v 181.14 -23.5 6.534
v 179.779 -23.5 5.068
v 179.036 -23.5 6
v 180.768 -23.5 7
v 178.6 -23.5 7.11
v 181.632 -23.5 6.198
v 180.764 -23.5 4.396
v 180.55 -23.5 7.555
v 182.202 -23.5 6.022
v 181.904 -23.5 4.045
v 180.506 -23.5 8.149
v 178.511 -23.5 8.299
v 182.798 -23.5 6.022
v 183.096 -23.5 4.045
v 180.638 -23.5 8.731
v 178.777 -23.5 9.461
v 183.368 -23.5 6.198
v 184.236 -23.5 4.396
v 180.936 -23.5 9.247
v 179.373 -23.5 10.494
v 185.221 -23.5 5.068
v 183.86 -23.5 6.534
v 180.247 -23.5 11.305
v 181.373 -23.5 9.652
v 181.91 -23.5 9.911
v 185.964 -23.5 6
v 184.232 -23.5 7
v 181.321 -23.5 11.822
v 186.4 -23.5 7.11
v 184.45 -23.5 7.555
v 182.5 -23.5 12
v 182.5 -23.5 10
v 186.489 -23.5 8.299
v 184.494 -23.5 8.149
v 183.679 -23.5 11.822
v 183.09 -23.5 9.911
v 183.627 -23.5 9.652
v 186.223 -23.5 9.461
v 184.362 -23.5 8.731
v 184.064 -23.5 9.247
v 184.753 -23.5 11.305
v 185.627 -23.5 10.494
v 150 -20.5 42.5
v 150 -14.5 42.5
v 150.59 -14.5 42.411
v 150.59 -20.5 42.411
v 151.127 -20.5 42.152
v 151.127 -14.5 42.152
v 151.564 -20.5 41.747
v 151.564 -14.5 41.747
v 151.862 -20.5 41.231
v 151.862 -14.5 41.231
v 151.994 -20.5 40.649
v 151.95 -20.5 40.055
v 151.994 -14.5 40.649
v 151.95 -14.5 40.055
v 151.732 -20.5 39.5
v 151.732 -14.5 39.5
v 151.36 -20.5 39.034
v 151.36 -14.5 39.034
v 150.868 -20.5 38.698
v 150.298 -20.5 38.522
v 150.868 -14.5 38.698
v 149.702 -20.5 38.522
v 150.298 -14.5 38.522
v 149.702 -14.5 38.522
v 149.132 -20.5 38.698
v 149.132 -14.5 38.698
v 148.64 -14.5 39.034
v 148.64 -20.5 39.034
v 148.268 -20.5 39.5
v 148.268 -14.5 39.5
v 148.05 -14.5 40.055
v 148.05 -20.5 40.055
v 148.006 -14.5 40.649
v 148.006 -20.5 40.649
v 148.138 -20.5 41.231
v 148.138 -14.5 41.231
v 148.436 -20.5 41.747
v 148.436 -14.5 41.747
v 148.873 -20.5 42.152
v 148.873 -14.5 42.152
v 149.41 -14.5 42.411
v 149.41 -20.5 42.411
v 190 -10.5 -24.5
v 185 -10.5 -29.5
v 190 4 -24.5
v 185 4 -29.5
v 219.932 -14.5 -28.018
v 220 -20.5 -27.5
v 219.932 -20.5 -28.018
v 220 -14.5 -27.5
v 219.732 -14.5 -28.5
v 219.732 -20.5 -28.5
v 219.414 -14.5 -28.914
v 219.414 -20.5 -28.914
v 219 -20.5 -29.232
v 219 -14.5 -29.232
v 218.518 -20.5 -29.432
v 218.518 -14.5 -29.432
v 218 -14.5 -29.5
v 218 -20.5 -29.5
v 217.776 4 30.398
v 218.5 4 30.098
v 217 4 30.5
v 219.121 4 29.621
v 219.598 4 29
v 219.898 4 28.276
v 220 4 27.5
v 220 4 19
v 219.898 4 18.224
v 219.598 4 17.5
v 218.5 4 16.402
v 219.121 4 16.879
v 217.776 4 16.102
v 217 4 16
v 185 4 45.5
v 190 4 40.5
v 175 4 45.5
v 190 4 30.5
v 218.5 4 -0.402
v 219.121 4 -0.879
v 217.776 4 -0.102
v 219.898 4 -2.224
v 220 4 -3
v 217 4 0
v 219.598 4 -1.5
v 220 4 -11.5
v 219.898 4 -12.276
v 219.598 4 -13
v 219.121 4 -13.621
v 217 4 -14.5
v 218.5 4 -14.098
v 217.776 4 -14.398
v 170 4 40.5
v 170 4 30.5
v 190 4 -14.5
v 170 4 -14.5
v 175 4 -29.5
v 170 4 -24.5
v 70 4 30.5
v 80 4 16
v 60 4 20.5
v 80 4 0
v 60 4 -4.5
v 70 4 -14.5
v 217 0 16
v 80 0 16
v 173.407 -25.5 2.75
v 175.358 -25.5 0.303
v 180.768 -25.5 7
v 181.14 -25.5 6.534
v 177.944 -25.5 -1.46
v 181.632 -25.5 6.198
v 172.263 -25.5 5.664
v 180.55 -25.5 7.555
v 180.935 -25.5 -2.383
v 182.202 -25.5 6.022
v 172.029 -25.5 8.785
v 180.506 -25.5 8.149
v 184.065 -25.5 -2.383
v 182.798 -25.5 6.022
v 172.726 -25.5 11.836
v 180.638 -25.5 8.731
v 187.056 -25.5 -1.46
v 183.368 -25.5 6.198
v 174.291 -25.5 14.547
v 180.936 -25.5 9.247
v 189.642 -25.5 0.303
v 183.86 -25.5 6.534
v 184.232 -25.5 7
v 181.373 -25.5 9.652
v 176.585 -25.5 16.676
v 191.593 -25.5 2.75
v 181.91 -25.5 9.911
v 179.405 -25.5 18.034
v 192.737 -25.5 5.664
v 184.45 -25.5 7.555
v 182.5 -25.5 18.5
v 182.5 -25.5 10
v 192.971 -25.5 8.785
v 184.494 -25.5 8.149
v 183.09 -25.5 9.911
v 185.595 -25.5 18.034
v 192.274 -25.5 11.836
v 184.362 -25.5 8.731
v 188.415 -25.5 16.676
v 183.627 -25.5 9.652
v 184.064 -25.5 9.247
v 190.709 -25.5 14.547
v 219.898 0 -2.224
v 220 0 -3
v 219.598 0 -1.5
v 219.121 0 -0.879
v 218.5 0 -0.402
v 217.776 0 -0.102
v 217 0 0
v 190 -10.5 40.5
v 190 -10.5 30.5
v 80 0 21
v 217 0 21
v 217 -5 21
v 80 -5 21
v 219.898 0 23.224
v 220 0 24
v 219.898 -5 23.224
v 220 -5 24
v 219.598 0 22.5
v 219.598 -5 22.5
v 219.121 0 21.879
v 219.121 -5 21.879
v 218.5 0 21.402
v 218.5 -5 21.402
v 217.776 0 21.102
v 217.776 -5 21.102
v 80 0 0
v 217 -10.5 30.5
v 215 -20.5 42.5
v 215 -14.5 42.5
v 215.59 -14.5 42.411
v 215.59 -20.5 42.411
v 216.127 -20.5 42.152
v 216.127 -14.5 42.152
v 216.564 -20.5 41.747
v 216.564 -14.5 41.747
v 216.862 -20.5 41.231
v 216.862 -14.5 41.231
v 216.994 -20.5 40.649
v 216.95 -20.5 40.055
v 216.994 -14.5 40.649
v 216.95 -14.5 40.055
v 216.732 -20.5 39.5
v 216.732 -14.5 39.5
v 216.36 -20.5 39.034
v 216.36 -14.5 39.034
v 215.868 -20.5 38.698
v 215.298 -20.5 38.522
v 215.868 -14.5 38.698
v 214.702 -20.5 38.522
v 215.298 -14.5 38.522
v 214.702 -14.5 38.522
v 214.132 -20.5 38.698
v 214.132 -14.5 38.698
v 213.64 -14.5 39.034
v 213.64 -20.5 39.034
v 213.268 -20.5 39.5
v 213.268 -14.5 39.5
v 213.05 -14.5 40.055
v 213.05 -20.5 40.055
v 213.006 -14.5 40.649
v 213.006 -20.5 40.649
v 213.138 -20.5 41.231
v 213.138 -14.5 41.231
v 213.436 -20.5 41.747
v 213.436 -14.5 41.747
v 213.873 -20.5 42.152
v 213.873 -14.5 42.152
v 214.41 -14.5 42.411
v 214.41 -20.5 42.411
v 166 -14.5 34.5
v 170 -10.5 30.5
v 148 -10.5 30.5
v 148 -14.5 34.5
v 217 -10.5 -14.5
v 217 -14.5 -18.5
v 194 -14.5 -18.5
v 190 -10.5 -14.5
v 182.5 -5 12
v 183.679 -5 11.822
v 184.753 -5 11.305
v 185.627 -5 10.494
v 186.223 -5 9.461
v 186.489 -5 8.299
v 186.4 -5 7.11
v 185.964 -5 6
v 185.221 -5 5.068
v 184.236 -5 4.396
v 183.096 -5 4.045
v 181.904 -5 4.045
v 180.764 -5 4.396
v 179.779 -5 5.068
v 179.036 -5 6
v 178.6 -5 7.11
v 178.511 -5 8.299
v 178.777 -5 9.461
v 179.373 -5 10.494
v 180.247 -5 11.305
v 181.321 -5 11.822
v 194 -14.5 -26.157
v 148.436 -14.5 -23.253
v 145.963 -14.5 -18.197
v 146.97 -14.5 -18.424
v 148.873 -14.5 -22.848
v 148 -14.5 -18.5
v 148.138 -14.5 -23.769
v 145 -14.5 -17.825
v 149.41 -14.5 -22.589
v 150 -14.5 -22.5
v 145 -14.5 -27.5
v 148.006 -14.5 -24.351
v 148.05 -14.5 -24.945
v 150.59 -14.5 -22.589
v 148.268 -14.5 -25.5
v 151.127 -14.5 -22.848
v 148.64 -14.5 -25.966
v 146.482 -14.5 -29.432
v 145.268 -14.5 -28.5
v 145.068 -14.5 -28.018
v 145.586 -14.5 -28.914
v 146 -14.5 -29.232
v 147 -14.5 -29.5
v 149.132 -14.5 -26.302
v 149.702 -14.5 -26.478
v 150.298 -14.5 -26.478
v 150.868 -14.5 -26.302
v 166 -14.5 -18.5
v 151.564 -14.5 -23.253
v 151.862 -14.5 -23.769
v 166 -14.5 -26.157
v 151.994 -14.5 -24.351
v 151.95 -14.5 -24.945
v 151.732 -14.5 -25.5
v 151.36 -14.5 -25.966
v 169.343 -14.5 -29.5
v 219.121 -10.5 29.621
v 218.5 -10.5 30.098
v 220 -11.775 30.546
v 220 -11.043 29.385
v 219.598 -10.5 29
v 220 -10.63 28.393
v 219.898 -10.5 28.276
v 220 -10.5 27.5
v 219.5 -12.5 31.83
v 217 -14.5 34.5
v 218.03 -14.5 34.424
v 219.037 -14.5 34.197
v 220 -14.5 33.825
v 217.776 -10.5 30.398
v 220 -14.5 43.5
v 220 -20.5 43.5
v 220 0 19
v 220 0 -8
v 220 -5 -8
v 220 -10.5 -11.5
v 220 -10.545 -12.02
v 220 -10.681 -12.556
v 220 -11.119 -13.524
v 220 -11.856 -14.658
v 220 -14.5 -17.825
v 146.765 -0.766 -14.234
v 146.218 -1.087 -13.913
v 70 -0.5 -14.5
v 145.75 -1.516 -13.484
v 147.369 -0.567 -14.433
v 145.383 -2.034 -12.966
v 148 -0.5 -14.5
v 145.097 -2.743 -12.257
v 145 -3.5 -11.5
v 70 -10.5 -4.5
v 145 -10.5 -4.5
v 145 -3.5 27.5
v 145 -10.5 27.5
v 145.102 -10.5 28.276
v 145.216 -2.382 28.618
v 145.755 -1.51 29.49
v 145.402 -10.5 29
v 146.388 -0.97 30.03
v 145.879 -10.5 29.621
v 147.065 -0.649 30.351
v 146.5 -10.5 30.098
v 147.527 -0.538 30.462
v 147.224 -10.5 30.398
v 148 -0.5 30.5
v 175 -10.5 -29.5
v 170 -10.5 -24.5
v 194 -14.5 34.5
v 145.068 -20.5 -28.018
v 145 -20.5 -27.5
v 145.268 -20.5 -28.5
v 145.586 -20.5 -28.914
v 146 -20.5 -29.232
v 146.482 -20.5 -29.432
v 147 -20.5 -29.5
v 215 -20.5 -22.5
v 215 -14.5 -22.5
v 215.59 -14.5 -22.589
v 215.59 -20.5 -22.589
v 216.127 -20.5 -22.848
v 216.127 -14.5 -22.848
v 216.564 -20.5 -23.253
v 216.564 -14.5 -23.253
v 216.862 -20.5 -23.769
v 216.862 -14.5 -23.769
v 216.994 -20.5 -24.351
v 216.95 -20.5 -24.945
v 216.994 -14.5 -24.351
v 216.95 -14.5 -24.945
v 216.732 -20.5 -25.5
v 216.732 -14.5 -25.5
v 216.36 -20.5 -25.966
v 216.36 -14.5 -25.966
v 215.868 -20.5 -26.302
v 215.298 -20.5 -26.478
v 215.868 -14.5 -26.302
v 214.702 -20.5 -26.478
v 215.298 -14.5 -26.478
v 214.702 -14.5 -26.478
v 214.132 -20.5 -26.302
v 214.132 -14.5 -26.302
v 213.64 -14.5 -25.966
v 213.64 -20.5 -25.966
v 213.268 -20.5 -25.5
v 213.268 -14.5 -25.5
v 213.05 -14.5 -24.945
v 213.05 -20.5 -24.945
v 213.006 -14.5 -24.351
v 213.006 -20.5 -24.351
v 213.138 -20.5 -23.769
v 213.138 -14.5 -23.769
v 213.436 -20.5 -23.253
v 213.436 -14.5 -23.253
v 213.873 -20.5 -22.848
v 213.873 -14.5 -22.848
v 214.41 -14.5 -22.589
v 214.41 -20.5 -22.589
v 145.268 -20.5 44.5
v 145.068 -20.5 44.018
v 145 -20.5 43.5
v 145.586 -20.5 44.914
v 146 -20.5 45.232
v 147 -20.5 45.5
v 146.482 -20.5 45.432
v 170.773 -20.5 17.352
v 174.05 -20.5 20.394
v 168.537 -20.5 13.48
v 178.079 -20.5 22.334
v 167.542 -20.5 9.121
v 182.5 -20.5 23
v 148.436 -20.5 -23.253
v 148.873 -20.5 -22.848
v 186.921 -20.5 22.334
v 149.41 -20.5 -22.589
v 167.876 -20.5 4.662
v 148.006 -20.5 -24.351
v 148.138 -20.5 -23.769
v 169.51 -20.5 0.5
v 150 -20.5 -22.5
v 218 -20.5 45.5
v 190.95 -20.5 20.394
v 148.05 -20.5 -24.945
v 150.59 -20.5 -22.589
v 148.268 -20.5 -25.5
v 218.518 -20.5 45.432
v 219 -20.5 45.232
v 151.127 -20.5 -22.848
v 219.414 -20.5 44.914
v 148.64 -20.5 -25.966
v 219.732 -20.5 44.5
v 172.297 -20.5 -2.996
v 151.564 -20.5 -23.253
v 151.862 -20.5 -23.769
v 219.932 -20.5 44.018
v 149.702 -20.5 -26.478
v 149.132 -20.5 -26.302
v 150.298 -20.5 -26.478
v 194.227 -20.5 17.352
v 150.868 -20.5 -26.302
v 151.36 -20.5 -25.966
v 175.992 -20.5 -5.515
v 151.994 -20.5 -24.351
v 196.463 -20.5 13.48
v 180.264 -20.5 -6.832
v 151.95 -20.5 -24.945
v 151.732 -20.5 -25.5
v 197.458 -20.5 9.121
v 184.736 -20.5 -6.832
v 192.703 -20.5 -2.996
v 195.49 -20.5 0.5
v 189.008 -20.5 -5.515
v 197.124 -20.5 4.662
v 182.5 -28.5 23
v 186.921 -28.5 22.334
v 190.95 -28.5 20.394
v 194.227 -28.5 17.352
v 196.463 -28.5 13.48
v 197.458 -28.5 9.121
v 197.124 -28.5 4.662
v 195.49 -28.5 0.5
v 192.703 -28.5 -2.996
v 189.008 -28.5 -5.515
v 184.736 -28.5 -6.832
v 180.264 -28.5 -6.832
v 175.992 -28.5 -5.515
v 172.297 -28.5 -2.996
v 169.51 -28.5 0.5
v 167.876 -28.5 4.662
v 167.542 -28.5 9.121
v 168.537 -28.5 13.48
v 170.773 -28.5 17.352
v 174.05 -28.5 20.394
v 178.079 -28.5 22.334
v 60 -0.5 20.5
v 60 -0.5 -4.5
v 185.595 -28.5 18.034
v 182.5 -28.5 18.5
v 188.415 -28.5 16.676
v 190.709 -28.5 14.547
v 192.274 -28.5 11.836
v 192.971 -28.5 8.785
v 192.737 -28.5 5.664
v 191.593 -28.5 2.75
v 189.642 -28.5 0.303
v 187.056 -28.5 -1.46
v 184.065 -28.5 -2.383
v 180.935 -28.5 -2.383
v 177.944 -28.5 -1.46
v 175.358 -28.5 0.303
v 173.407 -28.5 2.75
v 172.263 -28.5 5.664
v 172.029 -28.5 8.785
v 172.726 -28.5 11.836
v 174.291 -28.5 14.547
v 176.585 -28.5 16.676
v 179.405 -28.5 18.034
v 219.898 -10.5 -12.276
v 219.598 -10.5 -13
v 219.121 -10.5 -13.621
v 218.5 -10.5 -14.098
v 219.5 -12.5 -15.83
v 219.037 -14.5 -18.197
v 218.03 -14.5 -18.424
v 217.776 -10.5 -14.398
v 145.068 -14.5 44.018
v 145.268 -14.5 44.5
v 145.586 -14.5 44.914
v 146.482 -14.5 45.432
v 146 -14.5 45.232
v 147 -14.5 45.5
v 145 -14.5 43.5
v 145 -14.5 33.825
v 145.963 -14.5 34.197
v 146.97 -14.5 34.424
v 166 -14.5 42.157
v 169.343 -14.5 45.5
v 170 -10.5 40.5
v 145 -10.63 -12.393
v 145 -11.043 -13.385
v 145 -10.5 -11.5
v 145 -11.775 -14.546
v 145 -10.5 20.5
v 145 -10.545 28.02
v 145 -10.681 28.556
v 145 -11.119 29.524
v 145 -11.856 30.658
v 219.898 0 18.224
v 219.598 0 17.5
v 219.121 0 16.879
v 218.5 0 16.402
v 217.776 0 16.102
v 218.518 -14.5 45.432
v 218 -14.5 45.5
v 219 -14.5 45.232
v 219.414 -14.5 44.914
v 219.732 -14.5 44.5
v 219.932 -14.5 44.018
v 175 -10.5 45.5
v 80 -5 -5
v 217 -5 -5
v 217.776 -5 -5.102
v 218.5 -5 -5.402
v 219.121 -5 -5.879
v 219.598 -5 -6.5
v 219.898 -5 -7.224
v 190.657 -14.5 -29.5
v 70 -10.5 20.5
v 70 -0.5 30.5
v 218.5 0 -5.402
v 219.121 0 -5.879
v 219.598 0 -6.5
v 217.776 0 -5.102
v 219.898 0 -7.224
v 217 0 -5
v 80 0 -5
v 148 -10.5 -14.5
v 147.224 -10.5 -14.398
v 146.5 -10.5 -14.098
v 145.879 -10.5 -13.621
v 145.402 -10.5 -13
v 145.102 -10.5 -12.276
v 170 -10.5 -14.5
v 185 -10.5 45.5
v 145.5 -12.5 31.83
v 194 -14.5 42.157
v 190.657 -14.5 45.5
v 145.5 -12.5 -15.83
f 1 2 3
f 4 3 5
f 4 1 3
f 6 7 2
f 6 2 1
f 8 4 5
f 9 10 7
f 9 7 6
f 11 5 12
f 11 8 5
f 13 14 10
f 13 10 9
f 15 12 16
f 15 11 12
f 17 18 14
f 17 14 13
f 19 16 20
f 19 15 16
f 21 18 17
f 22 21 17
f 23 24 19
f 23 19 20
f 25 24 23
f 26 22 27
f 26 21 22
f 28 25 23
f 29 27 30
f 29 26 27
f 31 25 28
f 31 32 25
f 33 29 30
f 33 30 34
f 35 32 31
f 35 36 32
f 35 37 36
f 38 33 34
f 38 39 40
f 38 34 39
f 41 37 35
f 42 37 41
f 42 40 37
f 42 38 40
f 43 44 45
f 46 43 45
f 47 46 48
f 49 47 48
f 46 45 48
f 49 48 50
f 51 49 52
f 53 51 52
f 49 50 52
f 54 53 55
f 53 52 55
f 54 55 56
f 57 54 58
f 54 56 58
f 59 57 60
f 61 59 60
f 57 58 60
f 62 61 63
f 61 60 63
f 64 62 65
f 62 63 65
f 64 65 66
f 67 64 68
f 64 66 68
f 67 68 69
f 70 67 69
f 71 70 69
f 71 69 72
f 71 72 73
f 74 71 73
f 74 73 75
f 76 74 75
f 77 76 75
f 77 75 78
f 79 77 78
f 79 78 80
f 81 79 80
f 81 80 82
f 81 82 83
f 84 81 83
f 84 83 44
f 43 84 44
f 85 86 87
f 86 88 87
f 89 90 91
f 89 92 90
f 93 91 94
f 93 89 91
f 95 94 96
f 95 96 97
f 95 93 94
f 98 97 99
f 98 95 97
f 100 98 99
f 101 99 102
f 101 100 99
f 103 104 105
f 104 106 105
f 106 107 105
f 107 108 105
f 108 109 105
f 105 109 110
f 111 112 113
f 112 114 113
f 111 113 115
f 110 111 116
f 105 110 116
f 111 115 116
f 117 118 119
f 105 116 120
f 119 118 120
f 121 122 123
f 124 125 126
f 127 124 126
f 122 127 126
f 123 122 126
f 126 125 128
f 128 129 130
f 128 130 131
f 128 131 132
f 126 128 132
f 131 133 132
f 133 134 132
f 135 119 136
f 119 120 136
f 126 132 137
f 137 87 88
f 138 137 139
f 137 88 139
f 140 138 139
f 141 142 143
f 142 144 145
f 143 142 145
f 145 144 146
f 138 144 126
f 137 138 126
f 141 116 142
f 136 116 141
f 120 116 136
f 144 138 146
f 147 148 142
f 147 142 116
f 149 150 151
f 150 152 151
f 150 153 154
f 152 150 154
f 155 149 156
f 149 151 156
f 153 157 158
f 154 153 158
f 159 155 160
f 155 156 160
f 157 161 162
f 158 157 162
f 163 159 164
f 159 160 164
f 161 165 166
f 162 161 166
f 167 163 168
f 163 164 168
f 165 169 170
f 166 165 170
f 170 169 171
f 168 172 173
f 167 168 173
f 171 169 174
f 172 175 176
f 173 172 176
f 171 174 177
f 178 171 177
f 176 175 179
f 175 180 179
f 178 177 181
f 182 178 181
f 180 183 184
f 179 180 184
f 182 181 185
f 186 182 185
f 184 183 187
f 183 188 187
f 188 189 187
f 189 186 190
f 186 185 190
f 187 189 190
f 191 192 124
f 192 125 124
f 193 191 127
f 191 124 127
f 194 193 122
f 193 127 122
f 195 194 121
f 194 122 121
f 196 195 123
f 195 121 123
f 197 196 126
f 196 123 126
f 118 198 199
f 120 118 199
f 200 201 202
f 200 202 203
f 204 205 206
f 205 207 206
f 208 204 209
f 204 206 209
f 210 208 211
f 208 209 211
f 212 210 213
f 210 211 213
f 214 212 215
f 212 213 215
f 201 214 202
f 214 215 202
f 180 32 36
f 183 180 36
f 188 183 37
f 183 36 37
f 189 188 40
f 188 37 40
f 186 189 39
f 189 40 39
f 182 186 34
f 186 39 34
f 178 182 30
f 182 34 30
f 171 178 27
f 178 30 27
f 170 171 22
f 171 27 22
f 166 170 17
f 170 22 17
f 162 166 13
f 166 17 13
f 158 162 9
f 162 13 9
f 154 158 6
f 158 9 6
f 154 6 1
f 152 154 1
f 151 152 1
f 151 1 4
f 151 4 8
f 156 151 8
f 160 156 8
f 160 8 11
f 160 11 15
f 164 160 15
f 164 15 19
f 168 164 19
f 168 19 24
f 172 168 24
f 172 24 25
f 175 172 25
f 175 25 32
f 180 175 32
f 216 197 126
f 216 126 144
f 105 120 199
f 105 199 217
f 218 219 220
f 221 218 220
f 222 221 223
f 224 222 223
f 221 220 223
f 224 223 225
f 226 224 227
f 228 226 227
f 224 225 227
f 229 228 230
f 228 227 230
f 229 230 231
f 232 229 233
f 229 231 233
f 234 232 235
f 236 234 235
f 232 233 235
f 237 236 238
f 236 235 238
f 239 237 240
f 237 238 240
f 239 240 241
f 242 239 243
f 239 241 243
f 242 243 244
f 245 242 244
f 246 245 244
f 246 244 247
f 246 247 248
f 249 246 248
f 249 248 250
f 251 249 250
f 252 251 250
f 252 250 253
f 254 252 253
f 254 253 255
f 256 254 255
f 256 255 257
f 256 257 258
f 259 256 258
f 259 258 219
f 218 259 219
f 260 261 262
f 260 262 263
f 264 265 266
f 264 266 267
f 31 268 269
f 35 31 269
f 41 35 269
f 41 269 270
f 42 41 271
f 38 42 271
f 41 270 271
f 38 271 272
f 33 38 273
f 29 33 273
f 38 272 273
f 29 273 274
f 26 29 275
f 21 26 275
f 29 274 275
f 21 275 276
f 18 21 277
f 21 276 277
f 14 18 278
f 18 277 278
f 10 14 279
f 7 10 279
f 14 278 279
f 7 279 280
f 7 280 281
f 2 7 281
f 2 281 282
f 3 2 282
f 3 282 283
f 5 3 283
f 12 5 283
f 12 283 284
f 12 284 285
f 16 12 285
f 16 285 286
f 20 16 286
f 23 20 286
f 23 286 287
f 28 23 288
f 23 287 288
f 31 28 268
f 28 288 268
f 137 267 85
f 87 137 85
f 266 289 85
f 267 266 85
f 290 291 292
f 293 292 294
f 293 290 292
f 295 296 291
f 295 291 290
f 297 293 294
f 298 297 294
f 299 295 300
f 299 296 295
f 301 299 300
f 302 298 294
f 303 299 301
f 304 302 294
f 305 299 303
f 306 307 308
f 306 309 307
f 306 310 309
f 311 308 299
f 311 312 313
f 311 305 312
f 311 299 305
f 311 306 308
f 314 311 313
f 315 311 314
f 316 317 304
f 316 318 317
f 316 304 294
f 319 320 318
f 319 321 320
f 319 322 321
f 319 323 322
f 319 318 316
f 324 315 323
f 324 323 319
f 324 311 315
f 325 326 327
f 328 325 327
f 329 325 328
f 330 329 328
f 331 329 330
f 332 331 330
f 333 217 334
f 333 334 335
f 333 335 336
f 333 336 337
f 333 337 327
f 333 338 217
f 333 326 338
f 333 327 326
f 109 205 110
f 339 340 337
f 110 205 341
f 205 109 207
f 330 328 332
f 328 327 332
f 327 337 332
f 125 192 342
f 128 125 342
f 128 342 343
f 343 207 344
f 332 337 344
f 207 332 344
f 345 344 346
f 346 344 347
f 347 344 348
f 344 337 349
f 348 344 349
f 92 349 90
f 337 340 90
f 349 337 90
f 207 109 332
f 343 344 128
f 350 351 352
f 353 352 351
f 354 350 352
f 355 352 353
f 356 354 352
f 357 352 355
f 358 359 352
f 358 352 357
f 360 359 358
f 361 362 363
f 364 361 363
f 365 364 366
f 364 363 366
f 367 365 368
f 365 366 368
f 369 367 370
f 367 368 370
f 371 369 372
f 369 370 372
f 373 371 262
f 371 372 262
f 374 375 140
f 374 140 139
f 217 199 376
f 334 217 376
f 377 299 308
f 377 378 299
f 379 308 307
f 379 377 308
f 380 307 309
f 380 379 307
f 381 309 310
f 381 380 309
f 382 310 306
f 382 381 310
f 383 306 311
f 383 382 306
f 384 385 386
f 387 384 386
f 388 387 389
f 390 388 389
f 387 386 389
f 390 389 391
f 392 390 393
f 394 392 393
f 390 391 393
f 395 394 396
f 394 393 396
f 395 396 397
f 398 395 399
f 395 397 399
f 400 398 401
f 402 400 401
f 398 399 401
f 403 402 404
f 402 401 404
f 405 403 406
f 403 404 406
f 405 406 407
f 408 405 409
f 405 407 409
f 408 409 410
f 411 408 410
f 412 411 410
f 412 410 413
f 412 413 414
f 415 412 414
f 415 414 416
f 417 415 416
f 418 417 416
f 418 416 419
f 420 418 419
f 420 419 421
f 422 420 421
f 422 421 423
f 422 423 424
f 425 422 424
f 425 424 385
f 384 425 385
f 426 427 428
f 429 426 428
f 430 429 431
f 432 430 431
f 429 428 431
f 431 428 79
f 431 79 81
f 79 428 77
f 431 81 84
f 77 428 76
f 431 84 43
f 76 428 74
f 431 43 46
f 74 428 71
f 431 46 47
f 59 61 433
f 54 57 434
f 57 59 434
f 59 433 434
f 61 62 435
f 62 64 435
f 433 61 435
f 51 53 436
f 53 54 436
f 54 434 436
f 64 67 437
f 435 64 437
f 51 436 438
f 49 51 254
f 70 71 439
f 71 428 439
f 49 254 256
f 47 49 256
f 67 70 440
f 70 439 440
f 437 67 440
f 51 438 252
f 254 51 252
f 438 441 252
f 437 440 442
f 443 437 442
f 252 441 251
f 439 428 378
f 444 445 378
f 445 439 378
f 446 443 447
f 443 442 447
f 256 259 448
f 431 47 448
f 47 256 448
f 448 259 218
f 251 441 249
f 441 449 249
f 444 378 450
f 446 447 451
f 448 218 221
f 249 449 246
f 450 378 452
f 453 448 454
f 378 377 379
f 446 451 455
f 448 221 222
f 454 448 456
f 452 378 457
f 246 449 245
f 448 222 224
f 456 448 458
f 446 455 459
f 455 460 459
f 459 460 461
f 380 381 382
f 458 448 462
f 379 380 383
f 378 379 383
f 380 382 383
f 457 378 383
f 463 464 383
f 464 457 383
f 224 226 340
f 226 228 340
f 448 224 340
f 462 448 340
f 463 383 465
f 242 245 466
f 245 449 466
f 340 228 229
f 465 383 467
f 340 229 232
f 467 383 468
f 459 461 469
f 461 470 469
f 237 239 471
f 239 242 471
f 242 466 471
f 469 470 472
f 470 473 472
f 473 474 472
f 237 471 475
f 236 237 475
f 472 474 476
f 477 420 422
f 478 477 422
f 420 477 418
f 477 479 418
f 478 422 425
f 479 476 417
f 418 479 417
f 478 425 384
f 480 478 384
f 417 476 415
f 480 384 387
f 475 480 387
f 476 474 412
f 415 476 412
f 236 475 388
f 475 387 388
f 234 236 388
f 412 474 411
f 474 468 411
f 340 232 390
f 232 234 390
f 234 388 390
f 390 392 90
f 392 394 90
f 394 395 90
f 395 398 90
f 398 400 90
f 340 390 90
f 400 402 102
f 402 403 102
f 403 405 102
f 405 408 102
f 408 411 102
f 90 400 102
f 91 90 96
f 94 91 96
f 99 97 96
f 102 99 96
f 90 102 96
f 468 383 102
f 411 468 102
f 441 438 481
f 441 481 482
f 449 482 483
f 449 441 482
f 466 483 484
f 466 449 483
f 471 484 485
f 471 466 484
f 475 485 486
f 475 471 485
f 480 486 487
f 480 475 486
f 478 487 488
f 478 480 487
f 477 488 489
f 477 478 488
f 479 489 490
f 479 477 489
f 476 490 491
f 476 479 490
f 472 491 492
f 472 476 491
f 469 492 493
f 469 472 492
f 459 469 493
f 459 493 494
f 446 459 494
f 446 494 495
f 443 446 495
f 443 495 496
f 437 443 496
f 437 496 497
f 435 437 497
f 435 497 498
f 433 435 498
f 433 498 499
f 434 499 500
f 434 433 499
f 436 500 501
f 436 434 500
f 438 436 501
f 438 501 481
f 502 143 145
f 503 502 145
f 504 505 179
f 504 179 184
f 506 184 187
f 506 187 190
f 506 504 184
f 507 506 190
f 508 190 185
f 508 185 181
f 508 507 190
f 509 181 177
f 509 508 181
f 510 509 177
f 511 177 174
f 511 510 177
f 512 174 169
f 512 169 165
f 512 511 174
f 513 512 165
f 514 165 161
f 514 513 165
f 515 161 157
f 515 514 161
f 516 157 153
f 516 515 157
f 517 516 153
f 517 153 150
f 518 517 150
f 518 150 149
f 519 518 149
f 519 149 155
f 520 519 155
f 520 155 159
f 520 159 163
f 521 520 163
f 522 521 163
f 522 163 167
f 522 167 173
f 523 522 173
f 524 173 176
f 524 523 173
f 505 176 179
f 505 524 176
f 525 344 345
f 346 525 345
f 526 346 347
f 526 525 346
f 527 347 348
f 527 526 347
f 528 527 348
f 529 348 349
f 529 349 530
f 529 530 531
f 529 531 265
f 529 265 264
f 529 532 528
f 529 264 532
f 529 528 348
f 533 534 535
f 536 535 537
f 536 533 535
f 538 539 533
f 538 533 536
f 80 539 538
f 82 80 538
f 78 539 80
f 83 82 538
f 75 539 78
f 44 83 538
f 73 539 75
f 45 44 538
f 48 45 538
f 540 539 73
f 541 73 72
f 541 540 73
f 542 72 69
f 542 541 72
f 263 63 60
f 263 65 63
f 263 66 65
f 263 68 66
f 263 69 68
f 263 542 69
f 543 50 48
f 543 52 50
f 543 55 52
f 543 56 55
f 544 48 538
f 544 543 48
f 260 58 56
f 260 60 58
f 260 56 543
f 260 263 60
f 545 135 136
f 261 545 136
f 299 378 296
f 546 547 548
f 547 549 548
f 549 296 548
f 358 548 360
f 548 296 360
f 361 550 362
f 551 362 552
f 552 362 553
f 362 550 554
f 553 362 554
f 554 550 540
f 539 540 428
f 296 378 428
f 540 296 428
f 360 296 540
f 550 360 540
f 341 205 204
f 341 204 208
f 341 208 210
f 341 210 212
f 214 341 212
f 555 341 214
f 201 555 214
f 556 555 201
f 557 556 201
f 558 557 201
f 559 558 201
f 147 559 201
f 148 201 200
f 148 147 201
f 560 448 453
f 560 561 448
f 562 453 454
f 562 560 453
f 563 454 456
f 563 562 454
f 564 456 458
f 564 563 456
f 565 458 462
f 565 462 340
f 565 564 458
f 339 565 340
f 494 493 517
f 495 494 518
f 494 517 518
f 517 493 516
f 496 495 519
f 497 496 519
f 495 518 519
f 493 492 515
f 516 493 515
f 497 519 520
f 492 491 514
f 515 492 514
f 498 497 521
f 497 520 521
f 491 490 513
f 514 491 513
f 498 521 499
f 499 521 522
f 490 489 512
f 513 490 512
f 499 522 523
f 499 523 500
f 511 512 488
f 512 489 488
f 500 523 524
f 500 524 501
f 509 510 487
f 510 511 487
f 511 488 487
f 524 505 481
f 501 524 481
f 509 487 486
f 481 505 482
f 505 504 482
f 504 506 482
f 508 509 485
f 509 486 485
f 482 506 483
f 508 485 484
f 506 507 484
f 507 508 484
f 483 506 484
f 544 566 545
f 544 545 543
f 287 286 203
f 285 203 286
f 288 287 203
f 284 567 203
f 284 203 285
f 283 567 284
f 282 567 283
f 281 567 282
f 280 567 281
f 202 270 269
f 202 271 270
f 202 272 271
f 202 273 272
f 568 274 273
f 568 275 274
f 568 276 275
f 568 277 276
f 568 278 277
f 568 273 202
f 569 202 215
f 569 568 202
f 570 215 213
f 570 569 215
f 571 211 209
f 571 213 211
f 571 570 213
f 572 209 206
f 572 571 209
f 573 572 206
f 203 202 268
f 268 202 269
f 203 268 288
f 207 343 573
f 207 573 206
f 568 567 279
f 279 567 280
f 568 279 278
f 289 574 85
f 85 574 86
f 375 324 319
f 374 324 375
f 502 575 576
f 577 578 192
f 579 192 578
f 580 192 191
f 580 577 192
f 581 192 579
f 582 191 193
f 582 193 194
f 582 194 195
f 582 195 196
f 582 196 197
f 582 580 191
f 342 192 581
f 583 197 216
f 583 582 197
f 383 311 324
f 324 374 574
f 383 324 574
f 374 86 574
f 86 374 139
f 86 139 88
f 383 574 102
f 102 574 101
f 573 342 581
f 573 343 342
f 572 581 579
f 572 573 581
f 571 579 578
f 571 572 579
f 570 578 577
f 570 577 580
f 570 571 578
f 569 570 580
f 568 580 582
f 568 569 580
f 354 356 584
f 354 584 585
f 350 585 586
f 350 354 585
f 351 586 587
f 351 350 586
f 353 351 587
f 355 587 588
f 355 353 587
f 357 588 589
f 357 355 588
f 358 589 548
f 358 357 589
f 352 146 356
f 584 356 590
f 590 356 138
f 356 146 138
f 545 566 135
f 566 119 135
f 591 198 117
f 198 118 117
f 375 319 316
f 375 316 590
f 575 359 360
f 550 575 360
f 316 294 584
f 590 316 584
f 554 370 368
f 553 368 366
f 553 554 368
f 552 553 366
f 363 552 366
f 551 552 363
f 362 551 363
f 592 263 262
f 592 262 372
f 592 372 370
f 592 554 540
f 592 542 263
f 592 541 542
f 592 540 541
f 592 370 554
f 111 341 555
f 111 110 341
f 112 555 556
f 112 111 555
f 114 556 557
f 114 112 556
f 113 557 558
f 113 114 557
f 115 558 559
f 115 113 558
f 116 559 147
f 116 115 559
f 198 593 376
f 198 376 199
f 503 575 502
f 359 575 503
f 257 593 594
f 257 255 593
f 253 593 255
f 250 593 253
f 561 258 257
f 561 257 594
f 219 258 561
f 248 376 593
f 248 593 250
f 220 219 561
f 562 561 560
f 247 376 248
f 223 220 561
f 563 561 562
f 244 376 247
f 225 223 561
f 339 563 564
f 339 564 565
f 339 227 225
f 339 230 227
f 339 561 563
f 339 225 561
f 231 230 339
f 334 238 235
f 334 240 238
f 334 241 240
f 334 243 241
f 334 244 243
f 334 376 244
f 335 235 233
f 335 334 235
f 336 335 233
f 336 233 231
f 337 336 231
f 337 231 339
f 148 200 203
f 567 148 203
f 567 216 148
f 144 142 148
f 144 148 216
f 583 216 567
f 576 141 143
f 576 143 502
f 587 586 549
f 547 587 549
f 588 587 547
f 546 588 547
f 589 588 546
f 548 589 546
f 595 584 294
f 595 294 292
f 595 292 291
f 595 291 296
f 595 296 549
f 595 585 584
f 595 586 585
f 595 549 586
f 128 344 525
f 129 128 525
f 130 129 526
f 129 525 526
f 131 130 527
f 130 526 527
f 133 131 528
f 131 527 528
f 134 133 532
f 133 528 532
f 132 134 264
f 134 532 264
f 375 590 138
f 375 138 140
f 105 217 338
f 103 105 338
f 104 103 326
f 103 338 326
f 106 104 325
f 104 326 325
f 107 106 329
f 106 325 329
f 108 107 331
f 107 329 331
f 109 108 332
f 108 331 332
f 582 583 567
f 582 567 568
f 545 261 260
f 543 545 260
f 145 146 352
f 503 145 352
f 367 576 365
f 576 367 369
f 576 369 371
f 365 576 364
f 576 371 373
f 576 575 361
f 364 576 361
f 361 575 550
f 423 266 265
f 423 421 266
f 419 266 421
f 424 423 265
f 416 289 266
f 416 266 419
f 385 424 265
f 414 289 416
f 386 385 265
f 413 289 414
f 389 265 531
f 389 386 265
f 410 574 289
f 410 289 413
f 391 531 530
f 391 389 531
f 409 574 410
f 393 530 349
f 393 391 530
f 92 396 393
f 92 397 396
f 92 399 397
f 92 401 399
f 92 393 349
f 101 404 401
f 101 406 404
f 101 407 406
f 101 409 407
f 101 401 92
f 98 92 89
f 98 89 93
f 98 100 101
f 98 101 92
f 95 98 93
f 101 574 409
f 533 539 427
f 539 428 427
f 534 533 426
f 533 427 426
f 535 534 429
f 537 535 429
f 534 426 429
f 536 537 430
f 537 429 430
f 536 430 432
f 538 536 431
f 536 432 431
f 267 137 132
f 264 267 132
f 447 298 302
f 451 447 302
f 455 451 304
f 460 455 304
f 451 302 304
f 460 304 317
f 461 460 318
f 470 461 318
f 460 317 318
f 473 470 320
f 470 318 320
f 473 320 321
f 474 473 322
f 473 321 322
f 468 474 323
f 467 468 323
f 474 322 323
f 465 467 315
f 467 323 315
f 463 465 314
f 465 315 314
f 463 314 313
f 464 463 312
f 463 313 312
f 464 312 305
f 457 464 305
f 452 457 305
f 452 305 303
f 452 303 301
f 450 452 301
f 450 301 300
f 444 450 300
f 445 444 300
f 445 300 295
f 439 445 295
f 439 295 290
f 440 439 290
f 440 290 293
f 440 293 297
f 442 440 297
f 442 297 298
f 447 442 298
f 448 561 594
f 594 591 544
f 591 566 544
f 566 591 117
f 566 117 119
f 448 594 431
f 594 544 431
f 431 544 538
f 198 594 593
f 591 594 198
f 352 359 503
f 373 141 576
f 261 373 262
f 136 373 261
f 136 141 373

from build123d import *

# Parameters (mm, degrees)
BOSS_EXTRUDE1_DEPTH = 4
BOSS_EXTRUDE2_DEPTH = 5
BOSS_EXTRUDE3_START = -5
SKETCH3_W           = 160
SKETCH3_H           = 75
BOSS_EXTRUDE3_DEPTH = 5.5
BOSS_EXTRUDE4_START = -10.5
BOSS_EXTRUDE4_DEPTH = 10
BOSS_EXTRUDE7_START = -20.5
SKETCH17_R          = 15
BOSS_EXTRUDE7_DEPTH = 8
CUT_EXTRUDE1_START  = -28.5
SKETCH5_R           = 10.5
CUT_EXTRUDE1_DEPTH  = 3
CUT_EXTRUDE2_START  = -4
SKETCH7_R           = 2
CUT_EXTRUDE2_DEPTH  = 25
CUT_EXTRUDE3_START  = -5
SKETCH8_R           = 4
CUT_EXTRUDE3_DEPTH  = 18.5
CUT_EXTRUDE5_START  = 4
SKETCH18_W          = 110
SKETCH18_H          = 15
SKETCH18_W_2        = 30
CUT_EXTRUDE5_DEPTH  = 18.5
CUT_EXTRUDE6_START  = -4
SKETCH9_R           = 2
CUT_EXTRUDE6_DEPTH  = 40
CHAMFER1_SIZE       = 10
FILLET1_R           = 2
CHAMFER2_SIZE       = 5
FILLET6_R           = 3
CHAMFER4_SIZE       = 4


with BuildPart() as part:
    # Sketch1 → Boss-Extrude1 (new body)
    with BuildSketch(Plane(origin=(0, 0, 0), x_dir=(1, 0, 0), z_dir=(0, 1, 0))):
        Polygon((80, -16), (220, -16), (220, -45.5), (60, -45.5), (60, 29.5), (220, 29.5), (220, 0), (80, 0), align=None)
    extrude(amount=BOSS_EXTRUDE1_DEPTH)

    # Sketch2 → Boss-Extrude2 (add)
    with BuildSketch(Plane(origin=(0, 0, 0), x_dir=(1, 0, 0), z_dir=(0, 1, 0))):
        Polygon((220, 5), (220, 29.5), (60, 29.5), (60, -45.5), (220, -45.5), (220, -21), (80, -21), (80, 5), align=None)
    extrude(amount=-BOSS_EXTRUDE2_DEPTH)

    # Sketch3 → Boss-Extrude3 (add)
    with BuildSketch(Plane(origin=(0, 0, 0), x_dir=(1, 0, 0), z_dir=(0, 1, 0)).offset(BOSS_EXTRUDE3_START)):
        with Locations((140, -8)):
            Rectangle(SKETCH3_W, SKETCH3_H)
    extrude(amount=-BOSS_EXTRUDE3_DEPTH)

    # Sketch4 → Boss-Extrude4 (add)
    with BuildSketch(Plane(origin=(0, 0, 0), x_dir=(1, 0, 0), z_dir=(0, 1, 0)).offset(BOSS_EXTRUDE4_START)):
        Polygon((145, -8), (145, -45.5), (220, -45.5), (220, 29.5), (145, 29.5), align=None)
    extrude(amount=-BOSS_EXTRUDE4_DEPTH)

    # Sketch17 → Boss-Extrude7 (add)
    with BuildSketch(Plane(origin=(0, 0, 0), x_dir=(1, 0, 0), z_dir=(0, 1, 0)).offset(BOSS_EXTRUDE7_START)):
        with Locations(Location((182.5, -8, 0), (0, 0, 270))):
            Circle(SKETCH17_R)
    extrude(amount=-BOSS_EXTRUDE7_DEPTH)

    # Sketch5 → Cut-Extrude1 (cut)
    with BuildSketch(Plane(origin=(0, 0, 0), x_dir=(1, 0, 0), z_dir=(0, 1, 0)).offset(CUT_EXTRUDE1_START)):
        with Locations(Location((182.5, -8, 0), (0, 0, 270))):
            Circle(SKETCH5_R)
    extrude(amount=CUT_EXTRUDE1_DEPTH, mode=Mode.SUBTRACT)

    # Sketch7 → Cut-Extrude2 (cut)
    with BuildSketch(Plane(origin=(0, 0, 0), x_dir=(1, 0, 0), z_dir=(0, 1, 0)).offset(CUT_EXTRUDE2_START)):
        with Locations(Location((182.5, -8, 0), (0, 0, 270))):
            Circle(SKETCH7_R)
    extrude(amount=-CUT_EXTRUDE2_DEPTH, mode=Mode.SUBTRACT)

    # Sketch8 → Cut-Extrude3 (cut)
    with BuildSketch(Plane(origin=(0, 0, 0), x_dir=(1, 0, 0), z_dir=(0, 1, 0)).offset(CUT_EXTRUDE3_START)):
        with Locations(Location((182.5, -8, 0), (0, 0, 270))):
            Circle(SKETCH8_R)
    extrude(amount=-CUT_EXTRUDE3_DEPTH, mode=Mode.SUBTRACT)

    # Sketch18 → Cut-Extrude5 (cut)
    with BuildSketch(Plane(origin=(0, 0, 0), x_dir=(1, 0, 0), z_dir=(0, 1, 0)).offset(CUT_EXTRUDE5_START)):
        with Locations((115, 22)):
            Rectangle(SKETCH18_W, SKETCH18_H)
        with Locations((115, -38)):
            Rectangle(SKETCH18_W, SKETCH18_H)
        with Locations((205, 22)):
            Rectangle(SKETCH18_W_2, SKETCH18_H)
        with Locations((205, -38)):
            Rectangle(SKETCH18_W_2, SKETCH18_H)
    extrude(amount=-CUT_EXTRUDE5_DEPTH, mode=Mode.SUBTRACT)

    # Sketch9 → Cut-Extrude6 (cut)
    with BuildSketch(Plane(origin=(0, 0, 0), x_dir=(1, 0, 0), z_dir=(0, 1, 0)).offset(CUT_EXTRUDE6_START)):
        with Locations(Location((150, -40.5, 0), (0, 0, 270))):
            Circle(SKETCH9_R)
        with Locations(Location((150, 24.5, 0), (0, 0, 270))):
            Circle(SKETCH9_R)
        with Locations(Location((215, 24.5, 0), (0, 0, 270))):
            Circle(SKETCH9_R)
        with Locations(Location((215, -40.5, 0), (0, 0, 270))):
            Circle(SKETCH9_R)
    extrude(amount=-CUT_EXTRUDE6_DEPTH, mode=Mode.SUBTRACT)

    # Chamfer1
    chamfer1_edges = [part.edges().sort_by_distance(p)[0] for p in [
        (60, -10.5, 8),
        (102.5, -10.5, 30.5),
        (60, -3.25, 30.5),
        (102.5, -10.5, -14.5),
        (60, -3.25, -14.5),
    ]]
    chamfer(chamfer1_edges, length=CHAMFER1_SIZE)

    # Fillet1
    fillet1_edges = [part.edges().sort_by_distance(p)[0] for p in [
        (220, -17.5, 45.5),
        (220, -17.5, -29.5),
        (145, -17.5, 45.5),
        (145, -17.5, -29.5),
    ]]
    fillet(fillet1_edges, radius=FILLET1_R)

    # Chamfer2
    chamfer2_edges = [part.edges().sort_by_distance(p)[0] for p in [
        (170, -5.25, 45.5),
        (190, -5.25, -29.5),
        (190, -5.25, 45.5),
        (170, -5.25, -29.5),
    ]]
    chamfer(chamfer2_edges, length=CHAMFER2_SIZE)

    # Fillet6
    fillet6_edges = [part.edges().sort_by_distance(p)[0] for p in [
        (220, -5.25, -14.5),
        (220, -5.25, 30.5),
        (220, 2, 16),
        (220, 2, 0),
        (220, -2.5, -5),
        (220, -2.5, 21),
        (145, -7.5, -14.5),
        (145, -7.5, 30.5),
    ]]
    fillet(fillet6_edges, radius=FILLET6_R)

    # Chamfer4
    # the kernel refuses this chamfer: 4 mm, written as the material it adds along each edge
    with BuildSketch(Plane(origin=(180.286731952, -14.5, 30.5), x_dir=(0, 1, 0), z_dir=(-1, 0, 0)), Plane(origin=(180.286731952, -14.5, -14.5), x_dir=(0, 0, -1), z_dir=(-1, 0, 0))) as chamfer4_piece_1:
        Polygon((CHAMFER4_SIZE, 0), (0, -CHAMFER4_SIZE), (0, 0), align=None)
    extrude(amount=32.286731952)
    with BuildSketch(Plane(origin=(217, -14.5, -14.5), x_dir=(0, 0, -1), z_dir=(-1, 0, 0)), Plane(origin=(217, -14.5, 30.5), x_dir=(0, 1, 0), z_dir=(-1, 0, 0))) as chamfer4_piece_2:
        Polygon((CHAMFER4_SIZE, 0), (0, -CHAMFER4_SIZE), (0, 0), align=None)
    extrude(amount=37.286731952)
    with BuildSketch(Plane(origin=(190, -14.5, 20.213268048), x_dir=(1, 0, 0), z_dir=(0, 0, 1))) as chamfer4_piece_3_section:
        Polygon((CHAMFER4_SIZE, 0), (0, CHAMFER4_SIZE), (0, 0), align=None)
    chamfer4_piece_3 = extrude(amount=30.573463904, mode=Mode.PRIVATE)
    chamfer4_piece_3 = split(chamfer4_piece_3, bisect_by=Plane(origin=(200.143365976, -14.5, 30.356634024), z_dir=(-0.7071067811865476, 0, -0.7071067811865476)), keep=Keep.TOP, mode=Mode.PRIVATE)
    add(chamfer4_piece_3)
    with BuildSketch(Plane(origin=(170, -14.5, -34.786731952), x_dir=(-1, 0, 0), z_dir=(0, 0, 1))) as chamfer4_piece_4_section:
        Polygon((CHAMFER4_SIZE, 0), (0, -CHAMFER4_SIZE), (0, 0), align=None)
    chamfer4_piece_4 = extrude(amount=30.573463904, mode=Mode.PRIVATE)
    chamfer4_piece_4 = split(chamfer4_piece_4, bisect_by=Plane(origin=(175.143365976, -14.5, -29.643365976), z_dir=(0.7071067811865476, 0, 0.7071067811865476)), keep=Keep.TOP, mode=Mode.PRIVATE)
    add(chamfer4_piece_4)
    with BuildSketch(Plane(origin=(170, -14.5, 50.786731952), x_dir=(0, 1, 0), z_dir=(0, 0, -1))) as chamfer4_piece_5_section:
        Polygon((CHAMFER4_SIZE, 0), (0, -CHAMFER4_SIZE), (0, 0), align=None)
    chamfer4_piece_5 = extrude(amount=30.573463904, mode=Mode.PRIVATE)
    chamfer4_piece_5 = split(chamfer4_piece_5, bisect_by=Plane(origin=(175.143365976, -14.5, 45.643365976), z_dir=(0.7071067811865476, 0, -0.7071067811865476)), keep=Keep.TOP, mode=Mode.PRIVATE)
    add(chamfer4_piece_5)
    with BuildSketch(Plane(origin=(190, -14.5, -4.213268048), x_dir=(1, 0, 0), z_dir=(0, 0, -1))) as chamfer4_piece_6_section:
        Polygon((CHAMFER4_SIZE, 0), (0, -CHAMFER4_SIZE), (0, 0), align=None)
    chamfer4_piece_6 = extrude(amount=30.573463904, mode=Mode.PRIVATE)
    chamfer4_piece_6 = split(chamfer4_piece_6, bisect_by=Plane(origin=(200.143365976, -14.5, -14.356634024), z_dir=(-0.7071067811865476, 0, 0.7071067811865476)), keep=Keep.TOP, mode=Mode.PRIVATE)
    add(chamfer4_piece_6)
    with BuildSketch(Plane(origin=(177.726182081, -14.5, 52.773817919), x_dir=(0.7071067811865476, 0, 0.7071067811865476), z_dir=(0.7071067811865476, 0, -0.7071067811865476))) as chamfer4_piece_7_section:
        Polygon((CHAMFER4_SIZE, 0), (0, -CHAMFER4_SIZE), (0, 0), align=None)
    chamfer4_piece_7 = extrude(amount=27.644531716, mode=Mode.PRIVATE)
    chamfer4_piece_7 = split(chamfer4_piece_7, bisect_by=Plane(origin=(177.726182081, -14.5, 45.5), z_dir=(0, 0, -1)), keep=Keep.TOP, mode=Mode.PRIVATE)
    chamfer4_piece_7 = split(chamfer4_piece_7, bisect_by=Plane(origin=(190, -14.5, 52.773817919), z_dir=(-1, 0, 0)), keep=Keep.TOP, mode=Mode.PRIVATE)
    add(chamfer4_piece_7)
    with BuildSketch(Plane(origin=(182.273817919, -14.5, 52.773817919), x_dir=(0, 1, 0), z_dir=(-0.7071067811865476, 0, -0.7071067811865476))) as chamfer4_piece_8_section:
        Polygon((CHAMFER4_SIZE, 0), (0, -CHAMFER4_SIZE), (0, 0), align=None)
    chamfer4_piece_8 = extrude(amount=27.644531716, mode=Mode.PRIVATE)
    chamfer4_piece_8 = split(chamfer4_piece_8, bisect_by=Plane(origin=(170, -14.5, 52.773817919), z_dir=(1, 0, 0)), keep=Keep.TOP, mode=Mode.PRIVATE)
    chamfer4_piece_8 = split(chamfer4_piece_8, bisect_by=Plane(origin=(182.273817919, -14.5, 45.5), z_dir=(0, 0, -1)), keep=Keep.TOP, mode=Mode.PRIVATE)
    add(chamfer4_piece_8)
    with BuildSketch(Plane(origin=(182.273817919, -14.5, -36.773817919), x_dir=(-0.7071067811865476, 0, -0.7071067811865476), z_dir=(-0.7071067811865476, 0, 0.7071067811865476))) as chamfer4_piece_9_section:
        Polygon((CHAMFER4_SIZE, 0), (0, -CHAMFER4_SIZE), (0, 0), align=None)
    chamfer4_piece_9 = extrude(amount=27.644531716, mode=Mode.PRIVATE)
    chamfer4_piece_9 = split(chamfer4_piece_9, bisect_by=Plane(origin=(170, -14.5, -36.773817919), z_dir=(1, 0, 0)), keep=Keep.TOP, mode=Mode.PRIVATE)
    chamfer4_piece_9 = split(chamfer4_piece_9, bisect_by=Plane(origin=(182.273817919, -14.5, -29.5), z_dir=(0, 0, 1)), keep=Keep.TOP, mode=Mode.PRIVATE)
    add(chamfer4_piece_9)
    with BuildSketch(Plane(origin=(177.726182081, -14.5, -36.773817919), x_dir=(0.7071067811865476, 0, -0.7071067811865476), z_dir=(0.7071067811865476, 0, 0.7071067811865476))) as chamfer4_piece_10_section:
        Polygon((CHAMFER4_SIZE, 0), (0, CHAMFER4_SIZE), (0, 0), align=None)
    chamfer4_piece_10 = extrude(amount=27.644531716, mode=Mode.PRIVATE)
    chamfer4_piece_10 = split(chamfer4_piece_10, bisect_by=Plane(origin=(190, -14.5, -36.773817919), z_dir=(-1, 0, 0)), keep=Keep.TOP, mode=Mode.PRIVATE)
    chamfer4_piece_10 = split(chamfer4_piece_10, bisect_by=Plane(origin=(177.726182081, -14.5, -29.5), z_dir=(0, 0, 1)), keep=Keep.TOP, mode=Mode.PRIVATE)
    add(chamfer4_piece_10)
    with BuildSketch(Plane(origin=(148, -14.5, -11.5), x_dir=(0, 0, -1), z_dir=(1, 0, 0))) as chamfer4_piece_11_section:
        Polygon((3 + CHAMFER4_SIZE, 0), (3, CHAMFER4_SIZE), (3, 0), align=None)
    chamfer4_piece_11 = revolve(axis=Axis((148, -14.5, -11.5), (0, 1, 0)), revolution_arc=286.541029039, mode=Mode.PRIVATE)
    chamfer4_piece_11 = split(chamfer4_piece_11, bisect_by=Plane(origin=(145, -14.5, -11.5), z_dir=(1, 0, 0)), keep=Keep.TOP, mode=Mode.PRIVATE)
    add(chamfer4_piece_11)
    with BuildSketch(Plane(origin=(148, -14.5, 27.5), x_dir=(0, 0, 1), z_dir=(1, 0, 0))) as chamfer4_piece_12_section:
        Polygon((3, -CHAMFER4_SIZE), (3 + CHAMFER4_SIZE, 0), (3, 0), align=None)
    chamfer4_piece_12 = revolve(axis=Axis((148, -14.5, 27.5), (0, -1, 0)), revolution_arc=286.541029039, mode=Mode.PRIVATE)
    chamfer4_piece_12 = split(chamfer4_piece_12, bisect_by=Plane(origin=(145, -14.5, 27.5), z_dir=(1, 0, 0)), keep=Keep.TOP, mode=Mode.PRIVATE)
    add(chamfer4_piece_12)
    with BuildSketch(Plane(origin=(217, -14.5, 27.5), x_dir=(0, 0, 1), z_dir=(-1, 0, 0))) as chamfer4_piece_13_section:
        Polygon((3 + CHAMFER4_SIZE, 0), (3, CHAMFER4_SIZE), (3, 0), align=None)
    chamfer4_piece_13 = revolve(axis=Axis((217, -14.5, 27.5), (0, 1, 0)), revolution_arc=286.541029039, mode=Mode.PRIVATE)
    chamfer4_piece_13 = split(chamfer4_piece_13, bisect_by=Plane(origin=(220, -14.5, 27.5), z_dir=(-1, 0, 0)), keep=Keep.TOP, mode=Mode.PRIVATE)
    add(chamfer4_piece_13)
    with BuildSketch(Plane(origin=(217, -14.5, -11.5), x_dir=(-0.9586161079841448, 0, -0.28470187479770964), z_dir=(0.28470187479770964, 0, -0.9586161079841448))) as chamfer4_piece_14_section:
        Polygon((3 + CHAMFER4_SIZE, 0), (3, CHAMFER4_SIZE), (3, 0), align=None)
    chamfer4_piece_14 = revolve(axis=Axis((217, -14.5, -11.5), (0, 1, 0)), revolution_arc=286.541029039, mode=Mode.PRIVATE)
    chamfer4_piece_14 = split(chamfer4_piece_14, bisect_by=Plane(origin=(220, -14.5, -11.5), z_dir=(-1, 0, 0)), keep=Keep.TOP, mode=Mode.PRIVATE)
    add(chamfer4_piece_14)
    with BuildSketch(Plane(origin=(190, -14.5, 30.5), x_dir=(1, 0, 0), z_dir=(0, 0, 1))) as chamfer4_piece_15a_section:
        Polygon((CHAMFER4_SIZE, 0), (0, CHAMFER4_SIZE), (0, 0), align=None)
    chamfer4_piece_15a = extrude(amount=20.286731952, mode=Mode.PRIVATE)
    chamfer4_piece_15a = split(chamfer4_piece_15a, bisect_by=Plane(origin=(190, -14.5, 45.5), z_dir=(0, 0, -1)), keep=Keep.TOP, mode=Mode.PRIVATE)
    chamfer4_piece_15a = split(chamfer4_piece_15a, bisect_by=Plane(origin=(195, -14.5, 35.5), z_dir=(0.7071067811865476, 0, 0.7071067811865476)), keep=Keep.TOP, mode=Mode.PRIVATE)
    with BuildSketch(Plane(origin=(177.726182081, -14.5, 52.773817919), x_dir=(0.7071067811865476, 0, 0.7071067811865476), z_dir=(0.7071067811865476, 0, -0.7071067811865476))) as chamfer4_piece_15b_section:
        Polygon((CHAMFER4_SIZE, 0), (0, -CHAMFER4_SIZE), (0, 0), align=None)
    chamfer4_piece_15b = extrude(amount=27.644531716, mode=Mode.PRIVATE)
    chamfer4_piece_15b = split(chamfer4_piece_15b, bisect_by=Plane(origin=(177.726182081, -14.5, 45.5), z_dir=(0, 0, -1)), keep=Keep.TOP, mode=Mode.PRIVATE)
    chamfer4_piece_15b = split(chamfer4_piece_15b, bisect_by=Plane(origin=(190, -14.5, 52.773817919), z_dir=(1, 0, 0)), keep=Keep.TOP, mode=Mode.PRIVATE)
    chamfer4_piece_15 = chamfer4_piece_15a & chamfer4_piece_15b
    add(chamfer4_piece_15)
    with BuildSketch(Plane(origin=(182.273817919, -14.5, -36.773817919), x_dir=(-0.7071067811865476, 0, -0.7071067811865476), z_dir=(-0.7071067811865476, 0, 0.7071067811865476))) as chamfer4_piece_16a_section:
        Polygon((CHAMFER4_SIZE, 0), (0, -CHAMFER4_SIZE), (0, 0), align=None)
    chamfer4_piece_16a = extrude(amount=27.644531716, mode=Mode.PRIVATE)
    chamfer4_piece_16a = split(chamfer4_piece_16a, bisect_by=Plane(origin=(170, -14.5, -36.773817919), z_dir=(-1, 0, 0)), keep=Keep.TOP, mode=Mode.PRIVATE)
    chamfer4_piece_16a = split(chamfer4_piece_16a, bisect_by=Plane(origin=(182.273817919, -14.5, -29.5), z_dir=(0, 0, 1)), keep=Keep.TOP, mode=Mode.PRIVATE)
    with BuildSketch(Plane(origin=(170, -14.5, -34.786731952), x_dir=(-1, 0, 0), z_dir=(0, 0, 1))) as chamfer4_piece_16b_section:
        Polygon((CHAMFER4_SIZE, 0), (0, -CHAMFER4_SIZE), (0, 0), align=None)
    chamfer4_piece_16b = extrude(amount=20.286731952, mode=Mode.PRIVATE)
    chamfer4_piece_16b = split(chamfer4_piece_16b, bisect_by=Plane(origin=(175.143365976, -14.5, -29.643365976), z_dir=(-0.7071067811865476, 0, -0.7071067811865476)), keep=Keep.TOP, mode=Mode.PRIVATE)
    chamfer4_piece_16b = split(chamfer4_piece_16b, bisect_by=Plane(origin=(170, -14.5, -29.5), z_dir=(0, 0, 1)), keep=Keep.TOP, mode=Mode.PRIVATE)
    chamfer4_piece_16 = chamfer4_piece_16a & chamfer4_piece_16b
    add(chamfer4_piece_16)
    with BuildSketch(Plane(origin=(170, -14.5, 50.786731952), x_dir=(0, 1, 0), z_dir=(0, 0, -1))) as chamfer4_piece_17a_section:
        Polygon((CHAMFER4_SIZE, 0), (0, -CHAMFER4_SIZE), (0, 0), align=None)
    chamfer4_piece_17a = extrude(amount=20.286731952, mode=Mode.PRIVATE)
    chamfer4_piece_17a = split(chamfer4_piece_17a, bisect_by=Plane(origin=(175.143365976, -14.5, 45.643365976), z_dir=(-0.7071067811865476, 0, 0.7071067811865476)), keep=Keep.TOP, mode=Mode.PRIVATE)
    chamfer4_piece_17a = split(chamfer4_piece_17a, bisect_by=Plane(origin=(170, -14.5, 45.5), z_dir=(0, 0, -1)), keep=Keep.TOP, mode=Mode.PRIVATE)
    with BuildSketch(Plane(origin=(182.273817919, -14.5, 52.773817919), x_dir=(0, 1, 0), z_dir=(-0.7071067811865476, 0, -0.7071067811865476))) as chamfer4_piece_17b_section:
        Polygon((CHAMFER4_SIZE, 0), (0, -CHAMFER4_SIZE), (0, 0), align=None)
    chamfer4_piece_17b = extrude(amount=27.644531716, mode=Mode.PRIVATE)
    chamfer4_piece_17b = split(chamfer4_piece_17b, bisect_by=Plane(origin=(170, -14.5, 52.773817919), z_dir=(-1, 0, 0)), keep=Keep.TOP, mode=Mode.PRIVATE)
    chamfer4_piece_17b = split(chamfer4_piece_17b, bisect_by=Plane(origin=(182.273817919, -14.5, 45.5), z_dir=(0, 0, -1)), keep=Keep.TOP, mode=Mode.PRIVATE)
    chamfer4_piece_17 = chamfer4_piece_17a & chamfer4_piece_17b
    add(chamfer4_piece_17)
    with BuildSketch(Plane(origin=(190, -14.5, -14.5), x_dir=(1, 0, 0), z_dir=(0, 0, -1))) as chamfer4_piece_18a_section:
        Polygon((CHAMFER4_SIZE, 0), (0, -CHAMFER4_SIZE), (0, 0), align=None)
    chamfer4_piece_18a = extrude(amount=20.286731952, mode=Mode.PRIVATE)
    chamfer4_piece_18a = split(chamfer4_piece_18a, bisect_by=Plane(origin=(195, -14.5, -19.5), z_dir=(0.7071067811865476, 0, -0.7071067811865476)), keep=Keep.TOP, mode=Mode.PRIVATE)
    chamfer4_piece_18a = split(chamfer4_piece_18a, bisect_by=Plane(origin=(190, -14.5, -29.5), z_dir=(0, 0, 1)), keep=Keep.TOP, mode=Mode.PRIVATE)
    with BuildSketch(Plane(origin=(177.726182081, -14.5, -36.773817919), x_dir=(0.7071067811865476, 0, -0.7071067811865476), z_dir=(0.7071067811865476, 0, 0.7071067811865476))) as chamfer4_piece_18b_section:
        Polygon((CHAMFER4_SIZE, 0), (0, CHAMFER4_SIZE), (0, 0), align=None)
    chamfer4_piece_18b = extrude(amount=27.644531716, mode=Mode.PRIVATE)
    chamfer4_piece_18b = split(chamfer4_piece_18b, bisect_by=Plane(origin=(190, -14.5, -36.773817919), z_dir=(1, 0, 0)), keep=Keep.TOP, mode=Mode.PRIVATE)
    chamfer4_piece_18b = split(chamfer4_piece_18b, bisect_by=Plane(origin=(177.726182081, -14.5, -29.5), z_dir=(0, 0, 1)), keep=Keep.TOP, mode=Mode.PRIVATE)
    chamfer4_piece_18 = chamfer4_piece_18a & chamfer4_piece_18b
    add(chamfer4_piece_18)


solid = part.part
